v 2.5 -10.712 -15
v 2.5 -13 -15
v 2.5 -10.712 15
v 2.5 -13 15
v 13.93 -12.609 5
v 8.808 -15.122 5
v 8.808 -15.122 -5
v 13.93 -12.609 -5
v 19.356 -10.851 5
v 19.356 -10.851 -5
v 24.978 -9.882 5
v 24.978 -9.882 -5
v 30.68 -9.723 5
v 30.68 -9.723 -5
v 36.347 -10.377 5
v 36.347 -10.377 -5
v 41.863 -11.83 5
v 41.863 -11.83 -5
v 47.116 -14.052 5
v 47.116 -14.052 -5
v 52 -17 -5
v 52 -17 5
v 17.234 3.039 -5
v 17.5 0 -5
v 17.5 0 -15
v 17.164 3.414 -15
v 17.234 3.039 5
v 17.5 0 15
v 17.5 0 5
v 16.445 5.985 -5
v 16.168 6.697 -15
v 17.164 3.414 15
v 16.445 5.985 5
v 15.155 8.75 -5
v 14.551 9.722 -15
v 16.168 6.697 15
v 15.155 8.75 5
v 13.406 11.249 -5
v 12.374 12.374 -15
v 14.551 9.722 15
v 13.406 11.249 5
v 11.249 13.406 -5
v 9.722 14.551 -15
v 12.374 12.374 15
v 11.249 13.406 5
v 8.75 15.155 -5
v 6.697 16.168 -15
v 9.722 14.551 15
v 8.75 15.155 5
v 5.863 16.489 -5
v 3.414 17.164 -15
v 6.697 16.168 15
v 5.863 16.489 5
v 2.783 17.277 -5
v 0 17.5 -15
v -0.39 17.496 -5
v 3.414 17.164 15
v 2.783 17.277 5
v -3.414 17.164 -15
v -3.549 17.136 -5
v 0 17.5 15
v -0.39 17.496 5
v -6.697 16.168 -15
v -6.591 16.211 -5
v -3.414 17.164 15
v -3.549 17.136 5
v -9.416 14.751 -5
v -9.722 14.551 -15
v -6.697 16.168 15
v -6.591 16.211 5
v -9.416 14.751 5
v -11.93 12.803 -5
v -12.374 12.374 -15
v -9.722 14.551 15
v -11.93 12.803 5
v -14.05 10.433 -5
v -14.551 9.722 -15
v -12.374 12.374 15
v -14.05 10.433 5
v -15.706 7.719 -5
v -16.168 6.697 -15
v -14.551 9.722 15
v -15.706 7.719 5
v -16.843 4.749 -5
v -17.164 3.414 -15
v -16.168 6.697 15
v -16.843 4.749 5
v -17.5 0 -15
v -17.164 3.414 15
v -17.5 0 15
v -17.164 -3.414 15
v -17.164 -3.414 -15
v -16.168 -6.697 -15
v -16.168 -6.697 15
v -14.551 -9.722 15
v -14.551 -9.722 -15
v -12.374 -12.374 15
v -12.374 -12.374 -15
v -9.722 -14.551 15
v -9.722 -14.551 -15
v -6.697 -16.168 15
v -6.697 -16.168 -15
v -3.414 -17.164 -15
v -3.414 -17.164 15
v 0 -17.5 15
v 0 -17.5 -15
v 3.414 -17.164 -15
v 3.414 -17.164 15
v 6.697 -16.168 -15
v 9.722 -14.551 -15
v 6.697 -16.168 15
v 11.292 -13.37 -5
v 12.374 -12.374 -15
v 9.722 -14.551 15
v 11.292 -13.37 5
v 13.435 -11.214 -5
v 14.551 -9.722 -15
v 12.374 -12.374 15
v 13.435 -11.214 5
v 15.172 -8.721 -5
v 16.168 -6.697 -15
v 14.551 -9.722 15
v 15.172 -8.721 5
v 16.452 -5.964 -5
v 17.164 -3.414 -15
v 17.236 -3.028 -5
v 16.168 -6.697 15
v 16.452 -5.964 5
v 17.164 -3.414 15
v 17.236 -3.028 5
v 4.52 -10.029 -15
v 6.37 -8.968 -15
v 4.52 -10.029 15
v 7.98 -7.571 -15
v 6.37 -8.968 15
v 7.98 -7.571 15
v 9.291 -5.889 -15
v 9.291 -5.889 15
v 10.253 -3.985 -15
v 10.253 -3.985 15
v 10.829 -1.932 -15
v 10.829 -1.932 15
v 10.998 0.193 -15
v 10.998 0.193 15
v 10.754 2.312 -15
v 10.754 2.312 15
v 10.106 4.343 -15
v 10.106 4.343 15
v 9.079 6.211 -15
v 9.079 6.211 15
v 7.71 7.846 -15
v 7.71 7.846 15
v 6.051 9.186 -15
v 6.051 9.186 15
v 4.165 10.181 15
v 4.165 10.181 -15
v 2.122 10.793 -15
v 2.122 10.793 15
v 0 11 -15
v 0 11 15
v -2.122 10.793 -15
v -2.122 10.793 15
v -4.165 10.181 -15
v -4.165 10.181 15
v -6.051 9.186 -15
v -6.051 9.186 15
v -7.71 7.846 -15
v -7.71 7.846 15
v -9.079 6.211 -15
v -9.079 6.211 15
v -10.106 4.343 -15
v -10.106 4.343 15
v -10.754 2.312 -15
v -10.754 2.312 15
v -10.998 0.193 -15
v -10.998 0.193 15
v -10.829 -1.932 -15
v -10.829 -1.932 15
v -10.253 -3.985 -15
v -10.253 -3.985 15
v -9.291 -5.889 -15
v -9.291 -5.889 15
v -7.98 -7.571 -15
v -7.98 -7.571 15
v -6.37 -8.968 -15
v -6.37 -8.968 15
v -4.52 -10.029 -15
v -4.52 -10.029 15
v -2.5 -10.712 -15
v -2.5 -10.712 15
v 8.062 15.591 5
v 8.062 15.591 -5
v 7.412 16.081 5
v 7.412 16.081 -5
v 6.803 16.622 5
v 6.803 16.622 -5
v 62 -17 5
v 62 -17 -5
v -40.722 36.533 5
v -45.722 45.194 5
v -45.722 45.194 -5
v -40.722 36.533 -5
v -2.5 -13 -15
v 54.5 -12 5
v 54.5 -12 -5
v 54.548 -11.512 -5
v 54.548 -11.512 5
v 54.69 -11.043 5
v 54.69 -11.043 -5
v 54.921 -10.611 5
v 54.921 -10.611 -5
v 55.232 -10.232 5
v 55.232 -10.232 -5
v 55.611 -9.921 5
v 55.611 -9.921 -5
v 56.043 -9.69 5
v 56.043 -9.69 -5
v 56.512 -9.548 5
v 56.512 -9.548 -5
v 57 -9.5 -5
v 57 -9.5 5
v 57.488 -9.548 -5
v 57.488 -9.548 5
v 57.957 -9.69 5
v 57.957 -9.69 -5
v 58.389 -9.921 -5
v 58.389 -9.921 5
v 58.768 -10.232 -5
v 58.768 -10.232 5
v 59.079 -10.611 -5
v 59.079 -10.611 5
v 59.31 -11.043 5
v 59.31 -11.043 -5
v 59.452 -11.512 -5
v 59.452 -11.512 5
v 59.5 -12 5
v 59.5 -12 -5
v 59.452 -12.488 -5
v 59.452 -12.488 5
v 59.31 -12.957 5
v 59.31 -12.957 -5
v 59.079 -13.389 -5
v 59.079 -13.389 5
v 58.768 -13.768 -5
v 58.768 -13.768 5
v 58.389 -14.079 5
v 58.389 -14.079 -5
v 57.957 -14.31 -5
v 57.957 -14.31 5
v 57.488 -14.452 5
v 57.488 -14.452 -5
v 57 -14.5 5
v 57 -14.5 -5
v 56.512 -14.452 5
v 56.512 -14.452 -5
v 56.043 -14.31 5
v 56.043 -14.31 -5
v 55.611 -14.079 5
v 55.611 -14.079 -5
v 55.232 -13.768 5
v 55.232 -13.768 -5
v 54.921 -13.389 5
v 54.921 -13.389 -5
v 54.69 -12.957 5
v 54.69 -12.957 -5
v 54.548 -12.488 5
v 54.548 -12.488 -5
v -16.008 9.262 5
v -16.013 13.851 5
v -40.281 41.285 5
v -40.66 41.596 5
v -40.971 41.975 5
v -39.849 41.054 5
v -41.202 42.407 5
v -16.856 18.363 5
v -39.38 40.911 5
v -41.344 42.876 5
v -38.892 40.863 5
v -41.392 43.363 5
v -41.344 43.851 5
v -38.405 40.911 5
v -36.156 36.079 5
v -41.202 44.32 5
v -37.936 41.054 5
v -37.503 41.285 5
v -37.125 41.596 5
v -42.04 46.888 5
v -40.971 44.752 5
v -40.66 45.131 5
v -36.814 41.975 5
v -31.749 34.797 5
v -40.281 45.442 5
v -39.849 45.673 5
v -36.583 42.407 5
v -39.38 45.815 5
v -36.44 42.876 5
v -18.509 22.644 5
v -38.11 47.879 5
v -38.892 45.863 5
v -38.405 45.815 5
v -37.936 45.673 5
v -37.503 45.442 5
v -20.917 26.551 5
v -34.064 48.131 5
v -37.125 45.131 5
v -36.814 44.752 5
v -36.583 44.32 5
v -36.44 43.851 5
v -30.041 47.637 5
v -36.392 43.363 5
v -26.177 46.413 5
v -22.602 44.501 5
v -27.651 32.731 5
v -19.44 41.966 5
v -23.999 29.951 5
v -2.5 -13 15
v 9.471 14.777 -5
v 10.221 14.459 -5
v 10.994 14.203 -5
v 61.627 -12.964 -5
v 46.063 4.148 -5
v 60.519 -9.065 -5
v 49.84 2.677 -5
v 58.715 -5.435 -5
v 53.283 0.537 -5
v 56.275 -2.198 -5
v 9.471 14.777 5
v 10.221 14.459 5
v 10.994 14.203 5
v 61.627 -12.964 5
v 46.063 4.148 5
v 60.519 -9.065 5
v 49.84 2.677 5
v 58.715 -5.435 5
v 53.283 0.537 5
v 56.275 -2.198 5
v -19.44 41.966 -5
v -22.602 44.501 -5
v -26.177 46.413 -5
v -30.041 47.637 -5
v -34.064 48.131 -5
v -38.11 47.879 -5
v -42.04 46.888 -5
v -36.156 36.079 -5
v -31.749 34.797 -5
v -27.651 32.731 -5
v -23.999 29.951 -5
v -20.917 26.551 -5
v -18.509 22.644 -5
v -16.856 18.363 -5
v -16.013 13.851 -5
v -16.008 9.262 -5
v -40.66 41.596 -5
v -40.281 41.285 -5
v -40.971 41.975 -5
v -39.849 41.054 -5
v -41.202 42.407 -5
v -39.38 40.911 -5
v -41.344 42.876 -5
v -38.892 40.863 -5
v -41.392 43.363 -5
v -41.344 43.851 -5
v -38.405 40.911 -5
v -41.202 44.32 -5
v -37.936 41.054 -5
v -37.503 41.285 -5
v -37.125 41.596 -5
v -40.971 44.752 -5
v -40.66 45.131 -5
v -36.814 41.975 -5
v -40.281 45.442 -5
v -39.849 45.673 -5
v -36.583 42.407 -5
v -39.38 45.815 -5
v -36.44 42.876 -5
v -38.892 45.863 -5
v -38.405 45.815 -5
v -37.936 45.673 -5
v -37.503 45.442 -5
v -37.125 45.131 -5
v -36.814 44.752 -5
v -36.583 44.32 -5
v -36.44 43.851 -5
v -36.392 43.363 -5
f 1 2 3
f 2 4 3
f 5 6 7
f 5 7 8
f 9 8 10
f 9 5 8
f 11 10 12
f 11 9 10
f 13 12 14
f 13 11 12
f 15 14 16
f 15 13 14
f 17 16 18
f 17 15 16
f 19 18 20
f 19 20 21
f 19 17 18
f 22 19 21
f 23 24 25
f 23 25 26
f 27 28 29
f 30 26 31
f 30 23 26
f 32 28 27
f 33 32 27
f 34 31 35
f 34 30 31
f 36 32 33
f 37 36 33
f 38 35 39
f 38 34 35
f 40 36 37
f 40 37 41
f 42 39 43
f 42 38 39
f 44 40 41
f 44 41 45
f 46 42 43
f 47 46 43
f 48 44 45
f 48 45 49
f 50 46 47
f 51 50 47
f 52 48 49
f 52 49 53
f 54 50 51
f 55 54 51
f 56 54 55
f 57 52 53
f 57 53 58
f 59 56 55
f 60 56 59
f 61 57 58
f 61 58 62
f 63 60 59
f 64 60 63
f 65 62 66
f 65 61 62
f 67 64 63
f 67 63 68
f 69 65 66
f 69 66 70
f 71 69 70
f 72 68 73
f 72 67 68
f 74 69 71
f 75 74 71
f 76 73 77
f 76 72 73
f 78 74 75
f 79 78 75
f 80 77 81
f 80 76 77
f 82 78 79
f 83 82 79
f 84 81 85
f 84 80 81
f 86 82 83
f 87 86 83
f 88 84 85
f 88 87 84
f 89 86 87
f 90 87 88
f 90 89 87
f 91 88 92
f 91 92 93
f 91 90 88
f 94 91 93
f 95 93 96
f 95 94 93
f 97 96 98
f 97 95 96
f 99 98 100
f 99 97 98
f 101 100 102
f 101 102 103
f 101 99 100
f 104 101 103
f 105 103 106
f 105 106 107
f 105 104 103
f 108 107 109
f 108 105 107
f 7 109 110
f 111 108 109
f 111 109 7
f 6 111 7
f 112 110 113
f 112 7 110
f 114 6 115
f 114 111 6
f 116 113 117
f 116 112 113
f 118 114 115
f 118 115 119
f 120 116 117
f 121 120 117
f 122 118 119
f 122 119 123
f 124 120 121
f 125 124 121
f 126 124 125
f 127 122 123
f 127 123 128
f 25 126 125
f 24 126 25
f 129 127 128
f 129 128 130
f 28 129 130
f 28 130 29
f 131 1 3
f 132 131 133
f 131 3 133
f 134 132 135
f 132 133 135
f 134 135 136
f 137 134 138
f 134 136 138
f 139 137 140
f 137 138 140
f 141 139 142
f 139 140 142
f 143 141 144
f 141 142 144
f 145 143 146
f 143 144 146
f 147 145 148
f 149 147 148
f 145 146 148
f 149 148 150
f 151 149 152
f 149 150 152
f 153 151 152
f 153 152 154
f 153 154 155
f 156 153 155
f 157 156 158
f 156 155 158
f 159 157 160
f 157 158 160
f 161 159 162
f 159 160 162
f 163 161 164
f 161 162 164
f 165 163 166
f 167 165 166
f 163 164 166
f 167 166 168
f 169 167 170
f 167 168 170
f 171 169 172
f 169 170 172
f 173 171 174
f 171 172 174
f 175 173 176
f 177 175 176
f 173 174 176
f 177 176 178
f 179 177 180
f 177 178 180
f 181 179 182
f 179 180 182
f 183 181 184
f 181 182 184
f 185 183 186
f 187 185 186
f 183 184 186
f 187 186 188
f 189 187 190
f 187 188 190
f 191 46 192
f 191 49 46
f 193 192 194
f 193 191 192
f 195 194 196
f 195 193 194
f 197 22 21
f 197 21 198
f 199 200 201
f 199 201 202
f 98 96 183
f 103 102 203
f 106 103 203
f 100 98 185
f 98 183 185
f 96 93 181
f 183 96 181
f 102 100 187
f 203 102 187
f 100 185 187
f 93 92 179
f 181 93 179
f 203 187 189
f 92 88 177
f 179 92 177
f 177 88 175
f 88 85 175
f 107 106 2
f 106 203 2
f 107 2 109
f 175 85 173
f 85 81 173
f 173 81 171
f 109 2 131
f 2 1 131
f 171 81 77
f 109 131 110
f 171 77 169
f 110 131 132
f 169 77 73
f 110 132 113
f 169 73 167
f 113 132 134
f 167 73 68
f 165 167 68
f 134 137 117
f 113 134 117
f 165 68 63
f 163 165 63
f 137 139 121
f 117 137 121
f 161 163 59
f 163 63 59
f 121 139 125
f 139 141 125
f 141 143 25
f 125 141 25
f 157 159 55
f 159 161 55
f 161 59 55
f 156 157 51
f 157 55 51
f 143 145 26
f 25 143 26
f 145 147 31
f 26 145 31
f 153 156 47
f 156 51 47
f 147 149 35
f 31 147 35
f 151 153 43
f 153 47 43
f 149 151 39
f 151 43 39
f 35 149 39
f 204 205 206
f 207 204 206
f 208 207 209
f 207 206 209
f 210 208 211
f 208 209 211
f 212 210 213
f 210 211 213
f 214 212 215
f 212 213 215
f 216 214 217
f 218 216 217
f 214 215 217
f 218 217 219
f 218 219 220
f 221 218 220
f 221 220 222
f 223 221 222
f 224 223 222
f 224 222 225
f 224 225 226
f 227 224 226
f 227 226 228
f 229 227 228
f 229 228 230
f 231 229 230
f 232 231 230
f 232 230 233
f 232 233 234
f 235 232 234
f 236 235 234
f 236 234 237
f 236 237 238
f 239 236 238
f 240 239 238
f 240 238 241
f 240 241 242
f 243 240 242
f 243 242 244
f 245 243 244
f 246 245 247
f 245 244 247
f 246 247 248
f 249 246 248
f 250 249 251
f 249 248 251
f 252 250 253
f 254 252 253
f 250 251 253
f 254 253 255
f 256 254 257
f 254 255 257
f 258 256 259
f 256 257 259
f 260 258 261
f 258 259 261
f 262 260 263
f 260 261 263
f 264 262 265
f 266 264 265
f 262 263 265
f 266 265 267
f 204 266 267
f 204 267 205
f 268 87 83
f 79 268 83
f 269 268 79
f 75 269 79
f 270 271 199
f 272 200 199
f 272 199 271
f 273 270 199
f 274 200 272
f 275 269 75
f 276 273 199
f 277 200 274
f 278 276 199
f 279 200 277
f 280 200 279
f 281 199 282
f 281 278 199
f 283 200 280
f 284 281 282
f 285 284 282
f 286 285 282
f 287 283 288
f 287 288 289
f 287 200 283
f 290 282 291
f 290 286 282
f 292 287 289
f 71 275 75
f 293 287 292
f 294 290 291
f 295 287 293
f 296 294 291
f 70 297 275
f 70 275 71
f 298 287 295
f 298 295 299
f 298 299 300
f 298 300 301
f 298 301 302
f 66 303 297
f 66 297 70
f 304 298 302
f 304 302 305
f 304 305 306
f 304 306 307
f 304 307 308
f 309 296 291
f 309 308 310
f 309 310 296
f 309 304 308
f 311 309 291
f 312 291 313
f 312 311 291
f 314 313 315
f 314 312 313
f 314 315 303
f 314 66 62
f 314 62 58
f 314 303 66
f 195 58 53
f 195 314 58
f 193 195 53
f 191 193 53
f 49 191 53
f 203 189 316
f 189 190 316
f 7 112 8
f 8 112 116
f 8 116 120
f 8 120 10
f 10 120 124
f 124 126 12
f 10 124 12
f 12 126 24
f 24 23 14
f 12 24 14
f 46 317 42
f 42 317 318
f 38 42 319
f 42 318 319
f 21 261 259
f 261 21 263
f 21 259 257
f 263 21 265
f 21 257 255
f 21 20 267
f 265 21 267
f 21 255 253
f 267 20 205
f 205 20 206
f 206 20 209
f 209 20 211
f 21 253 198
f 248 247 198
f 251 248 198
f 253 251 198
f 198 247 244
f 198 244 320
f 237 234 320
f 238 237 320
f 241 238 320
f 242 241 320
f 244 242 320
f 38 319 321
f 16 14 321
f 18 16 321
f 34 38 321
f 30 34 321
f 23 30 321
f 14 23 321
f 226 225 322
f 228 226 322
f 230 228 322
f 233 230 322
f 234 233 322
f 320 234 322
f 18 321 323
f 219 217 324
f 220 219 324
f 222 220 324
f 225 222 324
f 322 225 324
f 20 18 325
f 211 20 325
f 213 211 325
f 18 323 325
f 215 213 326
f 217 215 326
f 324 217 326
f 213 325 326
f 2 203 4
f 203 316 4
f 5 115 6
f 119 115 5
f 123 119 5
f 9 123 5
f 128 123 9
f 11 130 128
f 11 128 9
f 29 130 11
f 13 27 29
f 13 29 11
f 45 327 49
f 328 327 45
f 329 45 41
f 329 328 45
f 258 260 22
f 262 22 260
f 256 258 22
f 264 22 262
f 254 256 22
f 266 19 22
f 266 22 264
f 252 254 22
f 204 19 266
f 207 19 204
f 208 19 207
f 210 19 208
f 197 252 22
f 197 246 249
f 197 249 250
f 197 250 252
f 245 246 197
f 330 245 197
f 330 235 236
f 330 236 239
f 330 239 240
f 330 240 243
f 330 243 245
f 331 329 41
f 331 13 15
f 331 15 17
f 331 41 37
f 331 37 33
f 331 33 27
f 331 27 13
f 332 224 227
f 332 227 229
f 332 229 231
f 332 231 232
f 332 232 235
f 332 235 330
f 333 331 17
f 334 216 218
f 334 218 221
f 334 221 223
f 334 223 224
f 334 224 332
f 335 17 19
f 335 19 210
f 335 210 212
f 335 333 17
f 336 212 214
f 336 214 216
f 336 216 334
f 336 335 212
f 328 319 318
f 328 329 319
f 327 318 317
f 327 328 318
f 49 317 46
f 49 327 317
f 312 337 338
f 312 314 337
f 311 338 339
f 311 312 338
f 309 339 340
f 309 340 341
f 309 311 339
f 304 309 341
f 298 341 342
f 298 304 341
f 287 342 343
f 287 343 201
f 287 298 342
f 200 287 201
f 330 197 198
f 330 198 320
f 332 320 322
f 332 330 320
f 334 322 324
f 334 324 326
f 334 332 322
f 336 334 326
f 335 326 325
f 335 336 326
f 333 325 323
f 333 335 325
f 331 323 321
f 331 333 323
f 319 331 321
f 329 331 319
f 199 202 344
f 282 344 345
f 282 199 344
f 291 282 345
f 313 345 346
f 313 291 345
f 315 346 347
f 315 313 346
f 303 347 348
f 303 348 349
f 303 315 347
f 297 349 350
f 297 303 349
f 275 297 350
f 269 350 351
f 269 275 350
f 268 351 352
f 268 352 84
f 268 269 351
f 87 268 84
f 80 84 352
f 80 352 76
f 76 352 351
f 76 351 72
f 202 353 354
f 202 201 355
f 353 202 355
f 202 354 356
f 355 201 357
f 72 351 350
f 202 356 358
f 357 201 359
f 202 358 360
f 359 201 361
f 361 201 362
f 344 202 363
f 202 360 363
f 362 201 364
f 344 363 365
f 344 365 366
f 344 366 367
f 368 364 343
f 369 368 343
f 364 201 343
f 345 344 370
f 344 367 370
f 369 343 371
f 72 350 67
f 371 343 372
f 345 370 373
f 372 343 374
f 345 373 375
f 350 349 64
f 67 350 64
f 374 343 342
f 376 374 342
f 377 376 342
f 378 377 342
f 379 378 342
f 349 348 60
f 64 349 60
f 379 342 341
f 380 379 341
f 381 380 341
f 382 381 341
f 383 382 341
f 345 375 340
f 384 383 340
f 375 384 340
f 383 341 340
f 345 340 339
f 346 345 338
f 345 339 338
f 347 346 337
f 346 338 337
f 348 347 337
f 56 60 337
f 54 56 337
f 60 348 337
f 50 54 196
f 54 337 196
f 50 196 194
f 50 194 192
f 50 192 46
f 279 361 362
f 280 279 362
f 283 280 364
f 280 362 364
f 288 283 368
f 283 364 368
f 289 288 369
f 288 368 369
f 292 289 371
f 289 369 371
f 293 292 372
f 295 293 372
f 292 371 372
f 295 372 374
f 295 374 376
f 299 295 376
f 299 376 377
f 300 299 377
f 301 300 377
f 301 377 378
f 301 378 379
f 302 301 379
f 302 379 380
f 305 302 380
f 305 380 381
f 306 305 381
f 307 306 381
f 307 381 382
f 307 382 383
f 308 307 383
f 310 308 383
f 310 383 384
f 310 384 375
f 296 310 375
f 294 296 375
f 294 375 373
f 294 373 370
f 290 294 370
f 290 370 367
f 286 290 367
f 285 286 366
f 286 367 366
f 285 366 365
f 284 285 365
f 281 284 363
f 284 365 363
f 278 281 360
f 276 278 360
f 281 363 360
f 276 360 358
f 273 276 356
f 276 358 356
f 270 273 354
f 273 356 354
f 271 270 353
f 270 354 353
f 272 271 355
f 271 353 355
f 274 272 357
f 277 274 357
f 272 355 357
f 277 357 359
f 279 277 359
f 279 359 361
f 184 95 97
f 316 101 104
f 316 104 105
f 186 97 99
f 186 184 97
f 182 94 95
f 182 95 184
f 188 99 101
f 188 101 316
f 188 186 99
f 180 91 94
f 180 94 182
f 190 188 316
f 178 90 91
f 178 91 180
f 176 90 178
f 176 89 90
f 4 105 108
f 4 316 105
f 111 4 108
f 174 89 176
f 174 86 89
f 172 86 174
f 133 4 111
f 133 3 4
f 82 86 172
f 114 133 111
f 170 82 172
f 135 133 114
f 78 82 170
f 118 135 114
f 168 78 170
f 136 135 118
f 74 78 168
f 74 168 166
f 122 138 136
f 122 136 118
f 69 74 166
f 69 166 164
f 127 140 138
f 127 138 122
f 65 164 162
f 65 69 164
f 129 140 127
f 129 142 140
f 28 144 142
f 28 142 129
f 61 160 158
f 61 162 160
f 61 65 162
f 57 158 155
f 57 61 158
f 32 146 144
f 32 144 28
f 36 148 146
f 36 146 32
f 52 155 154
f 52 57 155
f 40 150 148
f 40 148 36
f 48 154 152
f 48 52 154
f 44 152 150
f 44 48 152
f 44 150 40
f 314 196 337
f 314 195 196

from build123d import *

# Parameters (mm, degrees)
ESTRUSIONE_ESTRUSIONE1_DEPTH   = 5
ESTRUSIONE_ESTRUSIONE1_2_DEPTH = 5
SCHIZZO1_3_R                   = 17.5
ESTRUSIONE_ESTRUSIONE2_DEPTH   = 15
FORO_5_0_5_1_D                 = 5


with BuildPart() as part:
    # Schizzo1 → Estrusione-Estrusione1 (new, symmetric)
    with BuildSketch(Plane.XY):
        with BuildLine():
            ThreePointArc((-19.439551712, 41.966109335), (-32.041033104, 47.97699794), (-45.722431864, 45.193575035))
            Line((-45.722431864, 45.193575035), (-40.722431864, 36.533320997))
            ThreePointArc((-40.722431864, 36.533320997), (-20.917414575, 26.550556749), (-16.843225773, 4.749288954))
            ThreePointArc((-16.843225773, 4.749288954), (-6.591441138, 16.211196863), (8.74999975, 15.155444711))
            ThreePointArc((8.74999975, 15.155444711), (7.731749731, 15.829418888), (6.803236294, 16.62247443))
            Line((6.803236294, 16.62247443), (-19.439551712, 41.966109335))
        make_face()
    extrude(amount=ESTRUSIONE_ESTRUSIONE1_DEPTH, both=True)



with BuildPart() as body_2:
    # Schizzo1 → Estrusione-Estrusione1 2 (new, symmetric)
    with BuildSketch(Plane.XY):
        with BuildLine():
            ThreePointArc((17.5, 0), (15.172291449, -8.720755253), (8.808391751, -15.121581755))
            ThreePointArc((8.808391751, -15.121581755), (30.679829856, -9.722971831), (52, -17))
            Line((52, -17), (62, -17))
            ThreePointArc((62, -17), (57.569815566, -3.759849662), (46.063492638, 4.147909046))
            Line((46.063492638, 4.147909046), (10.993866983, 14.203012674))
            ThreePointArc((10.993866983, 14.203012674), (9.842803753, 14.61060124), (8.74999975, 15.155444711))
            ThreePointArc((8.74999975, 15.155444711), (15.155444494, 8.750000125), (17.5, 0))
        make_face()
    extrude(amount=ESTRUSIONE_ESTRUSIONE1_2_DEPTH, both=True)


with BuildPart() as part_1:
    add(part.part)

    add(body_2.part)  # Estrusione-Estrusione2 merges body 2
    # Schizzo1<3> → Estrusione-Estrusione2 (add, symmetric)
    with BuildSketch(Plane.XY):
        Circle(SCHIZZO1_3_R)
        with BuildLine():
            ThreePointArc((2.5, -10.712142643), (0, 11), (-2.5, -10.712142643))
            Line((-2.5, -10.712142643), (-2.5, -13))
            Line((-2.5, -13), (2.5, -13))
            Line((2.5, -13), (2.5, -10.712142643))
        make_face(mode=Mode.SUBTRACT)
    extrude(amount=ESTRUSIONE_ESTRUSIONE2_DEPTH, both=True)

    # Foro Ø5.0 (5)-1 (through all)
    with Locations(Plane.XY.offset(5)):
        with Locations((-38.892304845, 43.363448016), (57, -12)):
            Hole(FORO_5_0_5_1_D / 2)


solid = part_1.part
